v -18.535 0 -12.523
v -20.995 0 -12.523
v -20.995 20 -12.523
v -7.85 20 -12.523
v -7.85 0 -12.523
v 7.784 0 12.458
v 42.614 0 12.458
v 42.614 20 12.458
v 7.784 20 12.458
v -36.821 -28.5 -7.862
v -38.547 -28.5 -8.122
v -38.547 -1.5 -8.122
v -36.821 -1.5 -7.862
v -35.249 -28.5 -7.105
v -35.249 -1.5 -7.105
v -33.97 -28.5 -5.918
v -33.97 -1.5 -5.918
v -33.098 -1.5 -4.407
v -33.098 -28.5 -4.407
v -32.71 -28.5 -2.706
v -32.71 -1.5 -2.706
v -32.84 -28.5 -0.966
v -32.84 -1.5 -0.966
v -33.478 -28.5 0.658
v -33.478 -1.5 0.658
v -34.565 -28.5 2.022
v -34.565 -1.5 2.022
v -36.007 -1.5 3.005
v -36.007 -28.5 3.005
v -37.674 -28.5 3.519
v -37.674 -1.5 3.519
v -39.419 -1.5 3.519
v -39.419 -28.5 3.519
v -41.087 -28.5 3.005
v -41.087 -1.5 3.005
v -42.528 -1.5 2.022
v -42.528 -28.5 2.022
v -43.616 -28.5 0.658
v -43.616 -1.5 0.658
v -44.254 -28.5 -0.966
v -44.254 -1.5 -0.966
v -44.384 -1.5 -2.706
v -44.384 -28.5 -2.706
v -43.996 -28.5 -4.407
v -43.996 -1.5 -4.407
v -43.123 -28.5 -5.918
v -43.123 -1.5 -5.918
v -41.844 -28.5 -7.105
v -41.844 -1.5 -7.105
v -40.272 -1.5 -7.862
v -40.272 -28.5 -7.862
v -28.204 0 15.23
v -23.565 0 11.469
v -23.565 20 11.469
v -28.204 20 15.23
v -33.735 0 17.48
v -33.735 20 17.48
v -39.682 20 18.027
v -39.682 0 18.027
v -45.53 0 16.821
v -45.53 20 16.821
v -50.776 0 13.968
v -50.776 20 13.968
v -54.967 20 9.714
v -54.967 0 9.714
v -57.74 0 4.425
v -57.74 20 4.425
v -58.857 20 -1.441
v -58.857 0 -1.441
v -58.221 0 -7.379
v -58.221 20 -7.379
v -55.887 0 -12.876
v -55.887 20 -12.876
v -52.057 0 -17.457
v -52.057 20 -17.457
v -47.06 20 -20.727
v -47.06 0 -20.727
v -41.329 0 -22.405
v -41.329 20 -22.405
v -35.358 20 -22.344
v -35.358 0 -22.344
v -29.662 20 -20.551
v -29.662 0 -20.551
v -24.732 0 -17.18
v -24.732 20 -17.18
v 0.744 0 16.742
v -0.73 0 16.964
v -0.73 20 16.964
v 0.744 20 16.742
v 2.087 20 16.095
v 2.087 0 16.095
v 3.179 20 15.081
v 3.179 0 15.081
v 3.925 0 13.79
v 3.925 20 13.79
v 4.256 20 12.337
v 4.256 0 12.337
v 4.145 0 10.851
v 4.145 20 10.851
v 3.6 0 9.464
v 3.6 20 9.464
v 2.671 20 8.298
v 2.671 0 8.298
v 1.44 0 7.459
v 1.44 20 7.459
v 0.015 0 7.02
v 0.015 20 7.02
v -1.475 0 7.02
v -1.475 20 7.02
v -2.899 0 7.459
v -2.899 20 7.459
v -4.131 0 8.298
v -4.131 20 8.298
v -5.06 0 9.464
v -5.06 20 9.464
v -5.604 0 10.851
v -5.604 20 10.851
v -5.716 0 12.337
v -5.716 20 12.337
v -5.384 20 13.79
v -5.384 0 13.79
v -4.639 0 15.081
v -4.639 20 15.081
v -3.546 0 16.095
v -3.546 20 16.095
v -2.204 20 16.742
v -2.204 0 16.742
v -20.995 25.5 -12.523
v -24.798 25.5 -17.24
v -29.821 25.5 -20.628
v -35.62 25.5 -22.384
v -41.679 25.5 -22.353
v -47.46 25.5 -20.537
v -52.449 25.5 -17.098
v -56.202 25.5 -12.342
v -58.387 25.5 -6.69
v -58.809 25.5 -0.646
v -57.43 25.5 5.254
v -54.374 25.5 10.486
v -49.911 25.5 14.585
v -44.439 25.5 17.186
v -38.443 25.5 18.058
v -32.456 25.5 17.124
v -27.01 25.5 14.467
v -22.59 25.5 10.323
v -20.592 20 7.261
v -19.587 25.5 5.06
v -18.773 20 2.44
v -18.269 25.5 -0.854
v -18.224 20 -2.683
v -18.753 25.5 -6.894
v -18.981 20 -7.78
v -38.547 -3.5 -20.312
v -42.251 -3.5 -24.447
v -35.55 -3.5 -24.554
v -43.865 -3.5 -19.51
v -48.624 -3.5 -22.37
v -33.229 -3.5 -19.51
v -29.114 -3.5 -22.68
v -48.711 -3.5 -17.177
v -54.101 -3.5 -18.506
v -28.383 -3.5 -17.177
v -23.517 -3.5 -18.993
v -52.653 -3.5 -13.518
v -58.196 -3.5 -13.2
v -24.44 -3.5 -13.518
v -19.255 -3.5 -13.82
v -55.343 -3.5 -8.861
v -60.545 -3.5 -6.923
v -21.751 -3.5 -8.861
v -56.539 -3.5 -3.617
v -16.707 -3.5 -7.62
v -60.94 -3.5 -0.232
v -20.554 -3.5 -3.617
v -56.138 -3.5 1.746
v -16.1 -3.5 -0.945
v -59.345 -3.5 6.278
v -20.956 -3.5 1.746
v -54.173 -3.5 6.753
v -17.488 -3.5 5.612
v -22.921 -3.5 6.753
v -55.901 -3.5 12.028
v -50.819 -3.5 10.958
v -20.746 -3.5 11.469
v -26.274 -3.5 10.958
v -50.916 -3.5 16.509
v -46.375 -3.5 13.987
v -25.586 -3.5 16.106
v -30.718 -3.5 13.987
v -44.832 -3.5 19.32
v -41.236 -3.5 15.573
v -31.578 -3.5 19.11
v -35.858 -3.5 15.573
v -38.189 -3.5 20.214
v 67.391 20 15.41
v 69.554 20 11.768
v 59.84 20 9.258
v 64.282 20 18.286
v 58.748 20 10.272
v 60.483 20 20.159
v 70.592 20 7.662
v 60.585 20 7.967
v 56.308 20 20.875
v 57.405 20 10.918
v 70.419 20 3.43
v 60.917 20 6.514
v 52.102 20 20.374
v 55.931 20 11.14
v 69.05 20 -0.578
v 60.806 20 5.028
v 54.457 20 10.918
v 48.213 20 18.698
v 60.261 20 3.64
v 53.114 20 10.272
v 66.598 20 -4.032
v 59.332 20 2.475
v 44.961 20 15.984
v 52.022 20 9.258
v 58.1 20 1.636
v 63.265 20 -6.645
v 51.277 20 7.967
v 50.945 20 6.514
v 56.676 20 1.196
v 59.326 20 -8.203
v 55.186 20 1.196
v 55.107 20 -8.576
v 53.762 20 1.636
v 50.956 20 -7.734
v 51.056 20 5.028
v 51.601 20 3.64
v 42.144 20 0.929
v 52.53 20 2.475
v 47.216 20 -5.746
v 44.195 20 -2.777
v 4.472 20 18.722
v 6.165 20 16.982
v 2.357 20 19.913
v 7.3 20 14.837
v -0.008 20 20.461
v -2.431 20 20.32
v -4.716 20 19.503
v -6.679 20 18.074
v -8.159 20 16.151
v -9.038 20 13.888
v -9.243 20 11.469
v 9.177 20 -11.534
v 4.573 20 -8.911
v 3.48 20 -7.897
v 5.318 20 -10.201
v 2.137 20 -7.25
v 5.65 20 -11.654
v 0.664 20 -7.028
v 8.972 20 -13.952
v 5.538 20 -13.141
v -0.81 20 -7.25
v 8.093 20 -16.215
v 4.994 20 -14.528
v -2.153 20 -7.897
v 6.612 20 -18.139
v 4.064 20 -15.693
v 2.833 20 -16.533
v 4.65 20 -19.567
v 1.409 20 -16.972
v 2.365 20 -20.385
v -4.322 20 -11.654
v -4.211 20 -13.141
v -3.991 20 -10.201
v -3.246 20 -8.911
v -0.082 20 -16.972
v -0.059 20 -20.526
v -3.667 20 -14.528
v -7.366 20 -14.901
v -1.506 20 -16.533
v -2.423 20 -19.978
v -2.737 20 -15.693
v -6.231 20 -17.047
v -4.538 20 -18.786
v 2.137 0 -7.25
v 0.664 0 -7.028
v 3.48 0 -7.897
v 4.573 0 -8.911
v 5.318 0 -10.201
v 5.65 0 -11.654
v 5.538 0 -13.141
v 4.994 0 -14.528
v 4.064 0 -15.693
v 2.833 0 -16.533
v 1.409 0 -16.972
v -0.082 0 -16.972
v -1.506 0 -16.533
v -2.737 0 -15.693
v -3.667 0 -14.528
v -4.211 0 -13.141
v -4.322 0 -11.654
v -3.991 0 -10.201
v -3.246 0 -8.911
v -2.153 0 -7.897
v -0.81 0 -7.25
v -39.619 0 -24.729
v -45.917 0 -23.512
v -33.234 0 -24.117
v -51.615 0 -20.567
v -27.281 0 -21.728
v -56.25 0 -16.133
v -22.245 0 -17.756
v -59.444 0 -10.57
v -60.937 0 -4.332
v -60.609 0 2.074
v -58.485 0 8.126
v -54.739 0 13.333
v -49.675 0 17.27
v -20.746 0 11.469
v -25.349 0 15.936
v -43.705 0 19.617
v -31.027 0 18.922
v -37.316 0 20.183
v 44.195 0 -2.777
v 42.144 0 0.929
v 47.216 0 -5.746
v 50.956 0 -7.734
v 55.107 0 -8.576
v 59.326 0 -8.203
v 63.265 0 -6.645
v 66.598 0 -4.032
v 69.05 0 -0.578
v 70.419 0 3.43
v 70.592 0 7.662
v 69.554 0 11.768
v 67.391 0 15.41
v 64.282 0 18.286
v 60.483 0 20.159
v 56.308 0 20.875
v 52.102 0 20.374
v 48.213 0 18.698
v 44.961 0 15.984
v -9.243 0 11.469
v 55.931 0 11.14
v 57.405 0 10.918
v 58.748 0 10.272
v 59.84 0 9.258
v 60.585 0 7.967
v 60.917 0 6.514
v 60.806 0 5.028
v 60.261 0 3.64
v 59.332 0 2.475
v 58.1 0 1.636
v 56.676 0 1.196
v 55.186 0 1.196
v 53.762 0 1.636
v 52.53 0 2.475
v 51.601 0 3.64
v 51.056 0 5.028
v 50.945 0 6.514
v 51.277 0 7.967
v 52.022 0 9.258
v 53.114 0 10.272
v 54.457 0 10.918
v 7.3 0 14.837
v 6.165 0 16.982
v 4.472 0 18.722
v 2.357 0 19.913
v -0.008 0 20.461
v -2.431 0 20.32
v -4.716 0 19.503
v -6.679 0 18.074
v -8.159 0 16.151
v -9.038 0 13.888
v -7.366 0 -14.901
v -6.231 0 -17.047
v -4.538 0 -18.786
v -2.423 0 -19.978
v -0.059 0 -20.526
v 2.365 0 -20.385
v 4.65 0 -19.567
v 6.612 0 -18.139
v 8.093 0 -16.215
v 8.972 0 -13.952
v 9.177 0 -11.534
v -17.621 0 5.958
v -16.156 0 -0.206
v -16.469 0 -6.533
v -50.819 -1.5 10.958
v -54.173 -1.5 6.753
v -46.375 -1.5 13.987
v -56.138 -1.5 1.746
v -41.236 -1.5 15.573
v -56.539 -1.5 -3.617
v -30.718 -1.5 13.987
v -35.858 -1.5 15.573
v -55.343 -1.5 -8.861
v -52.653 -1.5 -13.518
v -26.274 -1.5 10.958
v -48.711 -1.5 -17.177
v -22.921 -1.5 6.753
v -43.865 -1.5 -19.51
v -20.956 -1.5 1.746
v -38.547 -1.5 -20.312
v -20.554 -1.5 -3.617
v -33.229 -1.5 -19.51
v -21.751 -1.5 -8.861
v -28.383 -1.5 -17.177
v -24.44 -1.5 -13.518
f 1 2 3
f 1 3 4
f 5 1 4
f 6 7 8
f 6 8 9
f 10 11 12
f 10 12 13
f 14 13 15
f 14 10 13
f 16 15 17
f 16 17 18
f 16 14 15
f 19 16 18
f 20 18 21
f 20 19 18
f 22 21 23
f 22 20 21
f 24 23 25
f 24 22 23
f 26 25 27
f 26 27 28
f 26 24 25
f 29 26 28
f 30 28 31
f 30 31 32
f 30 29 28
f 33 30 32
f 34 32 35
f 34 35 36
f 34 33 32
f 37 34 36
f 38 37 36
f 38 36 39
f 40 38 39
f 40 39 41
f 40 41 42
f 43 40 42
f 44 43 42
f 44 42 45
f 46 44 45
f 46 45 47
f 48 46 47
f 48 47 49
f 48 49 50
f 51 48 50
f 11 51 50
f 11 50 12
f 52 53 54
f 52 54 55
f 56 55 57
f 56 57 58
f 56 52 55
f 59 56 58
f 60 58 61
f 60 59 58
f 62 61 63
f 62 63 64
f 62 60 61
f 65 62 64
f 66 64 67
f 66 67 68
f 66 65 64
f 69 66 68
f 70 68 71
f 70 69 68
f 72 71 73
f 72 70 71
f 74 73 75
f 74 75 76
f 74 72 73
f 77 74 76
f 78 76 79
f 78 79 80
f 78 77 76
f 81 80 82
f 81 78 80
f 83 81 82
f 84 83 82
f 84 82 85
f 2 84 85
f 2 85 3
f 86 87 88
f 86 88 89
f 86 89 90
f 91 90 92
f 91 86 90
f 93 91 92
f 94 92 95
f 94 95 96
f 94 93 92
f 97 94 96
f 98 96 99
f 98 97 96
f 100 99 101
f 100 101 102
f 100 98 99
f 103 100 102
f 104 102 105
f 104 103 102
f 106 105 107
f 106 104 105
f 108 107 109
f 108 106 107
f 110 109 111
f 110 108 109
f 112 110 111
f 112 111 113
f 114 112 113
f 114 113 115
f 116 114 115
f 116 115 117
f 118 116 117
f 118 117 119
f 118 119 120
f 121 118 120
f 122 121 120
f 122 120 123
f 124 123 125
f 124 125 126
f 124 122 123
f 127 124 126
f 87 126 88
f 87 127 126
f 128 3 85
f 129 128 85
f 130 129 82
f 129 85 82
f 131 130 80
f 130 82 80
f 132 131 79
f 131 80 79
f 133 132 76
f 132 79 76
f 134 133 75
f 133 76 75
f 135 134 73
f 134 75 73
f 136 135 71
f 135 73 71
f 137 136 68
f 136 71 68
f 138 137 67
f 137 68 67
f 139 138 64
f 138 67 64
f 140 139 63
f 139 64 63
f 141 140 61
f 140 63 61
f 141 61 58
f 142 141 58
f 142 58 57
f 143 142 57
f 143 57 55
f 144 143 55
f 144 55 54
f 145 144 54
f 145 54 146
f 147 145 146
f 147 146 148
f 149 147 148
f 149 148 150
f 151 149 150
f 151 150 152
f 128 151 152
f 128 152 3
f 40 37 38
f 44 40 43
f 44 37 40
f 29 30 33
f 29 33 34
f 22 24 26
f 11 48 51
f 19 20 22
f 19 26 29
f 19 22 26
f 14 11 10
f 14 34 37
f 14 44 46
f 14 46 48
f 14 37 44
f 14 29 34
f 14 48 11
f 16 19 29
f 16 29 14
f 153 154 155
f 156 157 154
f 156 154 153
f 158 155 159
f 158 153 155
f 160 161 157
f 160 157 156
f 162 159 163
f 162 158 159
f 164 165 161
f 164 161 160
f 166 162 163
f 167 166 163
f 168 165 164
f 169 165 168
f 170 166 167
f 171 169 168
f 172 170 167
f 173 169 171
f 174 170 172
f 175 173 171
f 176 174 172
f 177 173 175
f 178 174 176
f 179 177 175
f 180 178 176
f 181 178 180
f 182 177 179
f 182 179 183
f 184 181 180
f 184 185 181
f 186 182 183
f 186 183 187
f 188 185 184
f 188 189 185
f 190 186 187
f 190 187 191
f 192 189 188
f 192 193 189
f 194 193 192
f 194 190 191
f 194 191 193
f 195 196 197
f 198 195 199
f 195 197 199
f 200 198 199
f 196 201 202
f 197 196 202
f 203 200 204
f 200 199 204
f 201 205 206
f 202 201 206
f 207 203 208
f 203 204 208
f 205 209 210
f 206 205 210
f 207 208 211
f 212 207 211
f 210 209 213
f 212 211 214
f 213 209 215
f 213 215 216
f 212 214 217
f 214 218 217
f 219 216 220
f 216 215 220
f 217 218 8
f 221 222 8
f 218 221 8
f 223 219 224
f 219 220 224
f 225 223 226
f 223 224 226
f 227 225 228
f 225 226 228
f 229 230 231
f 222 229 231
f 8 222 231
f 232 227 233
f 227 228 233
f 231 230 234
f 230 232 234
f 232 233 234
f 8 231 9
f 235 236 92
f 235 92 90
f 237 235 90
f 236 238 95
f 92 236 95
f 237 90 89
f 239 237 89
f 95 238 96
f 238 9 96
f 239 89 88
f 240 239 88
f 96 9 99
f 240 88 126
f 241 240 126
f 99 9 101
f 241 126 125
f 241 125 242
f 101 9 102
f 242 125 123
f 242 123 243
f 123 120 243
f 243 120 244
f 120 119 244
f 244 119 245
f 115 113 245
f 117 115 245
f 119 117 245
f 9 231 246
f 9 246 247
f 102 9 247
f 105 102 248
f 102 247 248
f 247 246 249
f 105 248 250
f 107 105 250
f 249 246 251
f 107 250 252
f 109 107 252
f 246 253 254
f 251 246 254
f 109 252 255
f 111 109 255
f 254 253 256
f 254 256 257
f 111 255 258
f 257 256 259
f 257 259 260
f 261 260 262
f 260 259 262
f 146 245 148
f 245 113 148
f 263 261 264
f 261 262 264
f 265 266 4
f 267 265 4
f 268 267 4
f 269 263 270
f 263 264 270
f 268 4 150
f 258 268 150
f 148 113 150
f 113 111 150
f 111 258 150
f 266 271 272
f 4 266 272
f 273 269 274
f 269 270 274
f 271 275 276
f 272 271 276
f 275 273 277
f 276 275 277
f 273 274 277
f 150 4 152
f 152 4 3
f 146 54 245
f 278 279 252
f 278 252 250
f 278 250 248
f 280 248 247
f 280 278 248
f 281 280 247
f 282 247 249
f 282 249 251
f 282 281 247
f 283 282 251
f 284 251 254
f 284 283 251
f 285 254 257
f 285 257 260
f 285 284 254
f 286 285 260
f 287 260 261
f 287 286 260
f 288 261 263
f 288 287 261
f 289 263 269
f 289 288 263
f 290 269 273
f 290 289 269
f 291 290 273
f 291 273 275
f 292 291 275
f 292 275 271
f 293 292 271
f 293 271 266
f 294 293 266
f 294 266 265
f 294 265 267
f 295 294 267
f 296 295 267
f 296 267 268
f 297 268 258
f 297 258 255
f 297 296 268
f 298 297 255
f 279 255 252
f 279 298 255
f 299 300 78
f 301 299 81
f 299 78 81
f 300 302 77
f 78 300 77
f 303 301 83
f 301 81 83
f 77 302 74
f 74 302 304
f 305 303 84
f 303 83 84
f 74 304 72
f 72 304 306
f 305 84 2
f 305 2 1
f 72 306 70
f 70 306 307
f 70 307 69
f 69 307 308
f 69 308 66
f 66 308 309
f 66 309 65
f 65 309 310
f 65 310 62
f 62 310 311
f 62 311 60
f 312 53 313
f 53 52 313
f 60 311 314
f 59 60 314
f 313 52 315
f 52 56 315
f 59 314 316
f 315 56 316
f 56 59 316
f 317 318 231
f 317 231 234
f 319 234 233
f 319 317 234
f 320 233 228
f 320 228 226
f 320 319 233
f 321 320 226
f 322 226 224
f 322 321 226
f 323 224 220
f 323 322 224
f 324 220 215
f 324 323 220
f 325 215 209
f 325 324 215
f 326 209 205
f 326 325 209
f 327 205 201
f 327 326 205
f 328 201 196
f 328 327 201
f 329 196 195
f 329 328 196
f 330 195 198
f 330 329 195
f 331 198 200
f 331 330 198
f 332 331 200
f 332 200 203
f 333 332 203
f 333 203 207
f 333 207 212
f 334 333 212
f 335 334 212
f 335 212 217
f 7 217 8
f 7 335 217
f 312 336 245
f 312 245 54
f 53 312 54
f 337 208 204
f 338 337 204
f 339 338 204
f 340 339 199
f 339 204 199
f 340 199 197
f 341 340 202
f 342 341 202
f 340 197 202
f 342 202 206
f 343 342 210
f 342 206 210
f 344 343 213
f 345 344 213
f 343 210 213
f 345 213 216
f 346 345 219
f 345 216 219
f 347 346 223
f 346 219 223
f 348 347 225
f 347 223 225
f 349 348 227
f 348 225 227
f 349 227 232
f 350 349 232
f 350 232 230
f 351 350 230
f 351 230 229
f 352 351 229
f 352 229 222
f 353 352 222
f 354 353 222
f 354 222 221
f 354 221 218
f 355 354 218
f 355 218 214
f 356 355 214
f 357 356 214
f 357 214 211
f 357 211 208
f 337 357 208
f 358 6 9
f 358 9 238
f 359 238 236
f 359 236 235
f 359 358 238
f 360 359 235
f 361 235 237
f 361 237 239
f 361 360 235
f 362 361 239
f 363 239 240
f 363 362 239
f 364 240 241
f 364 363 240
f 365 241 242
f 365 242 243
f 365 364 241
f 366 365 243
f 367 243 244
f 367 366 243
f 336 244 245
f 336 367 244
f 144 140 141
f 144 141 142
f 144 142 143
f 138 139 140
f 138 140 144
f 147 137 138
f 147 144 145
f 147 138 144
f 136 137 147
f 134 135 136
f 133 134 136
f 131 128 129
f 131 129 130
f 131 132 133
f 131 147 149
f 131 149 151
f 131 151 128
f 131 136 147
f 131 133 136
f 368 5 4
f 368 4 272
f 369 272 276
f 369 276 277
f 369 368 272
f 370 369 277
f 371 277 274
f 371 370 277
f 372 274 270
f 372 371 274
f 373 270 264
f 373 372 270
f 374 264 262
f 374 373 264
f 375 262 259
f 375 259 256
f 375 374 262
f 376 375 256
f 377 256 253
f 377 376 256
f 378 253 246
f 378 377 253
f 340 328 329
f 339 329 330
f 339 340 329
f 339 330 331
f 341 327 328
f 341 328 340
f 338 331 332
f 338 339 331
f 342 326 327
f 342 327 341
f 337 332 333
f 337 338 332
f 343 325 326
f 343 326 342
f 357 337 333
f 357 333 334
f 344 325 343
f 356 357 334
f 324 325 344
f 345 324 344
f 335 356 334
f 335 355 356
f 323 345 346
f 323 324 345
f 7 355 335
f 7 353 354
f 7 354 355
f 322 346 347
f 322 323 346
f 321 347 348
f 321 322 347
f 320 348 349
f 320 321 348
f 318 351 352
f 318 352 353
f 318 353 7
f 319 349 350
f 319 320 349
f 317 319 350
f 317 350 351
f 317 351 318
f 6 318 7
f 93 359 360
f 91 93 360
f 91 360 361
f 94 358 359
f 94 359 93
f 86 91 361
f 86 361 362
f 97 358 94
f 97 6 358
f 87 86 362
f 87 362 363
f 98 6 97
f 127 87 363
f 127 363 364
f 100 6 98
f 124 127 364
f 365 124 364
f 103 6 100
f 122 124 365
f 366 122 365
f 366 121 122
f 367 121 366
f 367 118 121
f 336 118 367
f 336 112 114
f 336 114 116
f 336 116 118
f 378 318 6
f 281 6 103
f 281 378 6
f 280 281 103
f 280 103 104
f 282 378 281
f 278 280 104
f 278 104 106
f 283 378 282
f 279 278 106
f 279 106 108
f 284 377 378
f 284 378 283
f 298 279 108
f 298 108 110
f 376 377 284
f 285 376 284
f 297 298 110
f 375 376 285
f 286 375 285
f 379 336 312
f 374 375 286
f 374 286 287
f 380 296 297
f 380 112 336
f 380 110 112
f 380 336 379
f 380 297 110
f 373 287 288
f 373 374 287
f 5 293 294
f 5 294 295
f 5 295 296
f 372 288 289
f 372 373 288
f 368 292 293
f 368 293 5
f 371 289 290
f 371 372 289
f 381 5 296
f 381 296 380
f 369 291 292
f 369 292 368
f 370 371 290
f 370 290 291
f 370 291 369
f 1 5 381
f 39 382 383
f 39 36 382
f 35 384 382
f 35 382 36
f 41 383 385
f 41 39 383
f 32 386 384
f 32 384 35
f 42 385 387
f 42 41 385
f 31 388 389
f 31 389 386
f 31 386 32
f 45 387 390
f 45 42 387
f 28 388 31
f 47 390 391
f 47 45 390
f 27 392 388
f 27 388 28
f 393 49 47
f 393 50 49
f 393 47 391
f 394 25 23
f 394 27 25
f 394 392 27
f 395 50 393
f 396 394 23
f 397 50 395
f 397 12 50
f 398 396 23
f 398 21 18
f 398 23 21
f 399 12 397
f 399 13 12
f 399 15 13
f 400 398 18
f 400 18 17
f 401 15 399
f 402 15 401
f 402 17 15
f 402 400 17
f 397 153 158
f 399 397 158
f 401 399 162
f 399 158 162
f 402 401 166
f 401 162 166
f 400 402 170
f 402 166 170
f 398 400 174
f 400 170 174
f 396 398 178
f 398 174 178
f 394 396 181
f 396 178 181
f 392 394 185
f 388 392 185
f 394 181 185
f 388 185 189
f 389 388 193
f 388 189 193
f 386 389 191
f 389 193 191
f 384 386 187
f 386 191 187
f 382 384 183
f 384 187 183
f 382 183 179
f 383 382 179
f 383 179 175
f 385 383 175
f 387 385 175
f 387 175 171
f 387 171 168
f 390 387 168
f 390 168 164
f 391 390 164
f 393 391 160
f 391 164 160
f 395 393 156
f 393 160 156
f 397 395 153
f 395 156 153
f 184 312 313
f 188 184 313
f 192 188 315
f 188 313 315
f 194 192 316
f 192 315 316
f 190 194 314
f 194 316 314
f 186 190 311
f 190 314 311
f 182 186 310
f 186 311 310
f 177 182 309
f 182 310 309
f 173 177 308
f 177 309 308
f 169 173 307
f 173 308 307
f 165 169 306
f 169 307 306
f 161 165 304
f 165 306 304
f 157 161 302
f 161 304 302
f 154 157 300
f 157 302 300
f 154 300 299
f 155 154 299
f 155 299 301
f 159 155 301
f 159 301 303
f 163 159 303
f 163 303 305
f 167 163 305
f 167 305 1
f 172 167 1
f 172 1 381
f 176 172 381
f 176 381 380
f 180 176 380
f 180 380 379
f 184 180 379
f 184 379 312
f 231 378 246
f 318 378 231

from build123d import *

# Parameters (mm, degrees)
SKETCH1_R           = 5
BOSS_EXTRUDE1_DEPTH = 20
SKETCH2_R           = 5
CUT_EXTRUDE1_DEPTH  = 75
SKETCH3_R           = 22.485447426
BOSS_EXTRUDE2_DEPTH = 3.5
SKETCH4_R           = 20.327044556
BOSS_EXTRUDE3_DEPTH = 5.5
SKETCH5_R           = 18.043078954
SKETCH5_R_2         = 5.853514337
CUT_EXTRUDE2_DEPTH  = 2
BOSS_EXTRUDE5_START = 25
SKETCH7_R           = 5.853514337
BOSS_EXTRUDE5_DEPTH = 25


with BuildPart() as part:
    # Sketch1 → Boss-Extrude1 (new body)
    with BuildSketch(Plane(origin=(0, 0, 0), x_dir=(1, 0, 0), z_dir=(0, 1, 0))):
        with BuildLine():
            Line((9.177252883, 11.533668593), (42.143741373, -0.928512909))
            ThreePointArc((42.143741373, -0.928512909), (70.658147952, -5.539619318), (42.614104982, -12.458097383))
            Line((42.614104982, -12.458097383), (7.783972854, -12.458097383))
            ThreePointArc((7.783972854, -12.458097383), (-1.224173666, -20.477404202), (-9.243480486, -11.469257682))
            Line((-9.243480486, -11.469257682), (-23.565055604, -11.469257682))
            ThreePointArc((-23.565055604, -11.469257682), (-58.758292474, 4.433528189), (-20.995467888, 12.522508294))
            Line((-20.995467888, 12.522508294), (-7.850200457, 12.522508294))
            ThreePointArc((-7.850200457, 12.522508294), (1.157946064, 20.541815114), (9.177252883, 11.533668593))
        make_face()
        with Locations(Location((0.663526213, 12.028088444, 0), (0, 0, 270))):
            Circle(SKETCH1_R, mode=Mode.SUBTRACT)
        with Locations(Location((-0.729753816, -11.963677532, 0), (0, 0, 270))):
            Circle(SKETCH1_R, mode=Mode.SUBTRACT)
    extrude(amount=BOSS_EXTRUDE1_DEPTH)

    # Sketch2 → Cut-Extrude1 (cut)
    with BuildSketch(Plane(origin=(0, 20, 0), x_dir=(1, 0, 0), z_dir=(0, 1, 0))):
        with Locations(Location((55.93095175, -6.140433438, 0), (0, 0, 270))):
            Circle(SKETCH2_R)
    extrude(amount=-CUT_EXTRUDE1_DEPTH, mode=Mode.SUBTRACT)

    # Sketch3 → Boss-Extrude2 (add)
    with BuildSketch(Plane.XZ):
        with Locations(Location((-38.546840471, -2.268823063, 0), (0, 0, 37.660146308))):
            Circle(SKETCH3_R)
    extrude(amount=BOSS_EXTRUDE2_DEPTH)

    # Sketch4 → Boss-Extrude3 (add)
    with BuildSketch(Plane(origin=(0, 20, 0), x_dir=(1, 0, 0), z_dir=(0, 1, 0))):
        with Locations(Location((-38.546840471, 2.268823063, 0), (0, 0, 30.293894425))):
            Circle(SKETCH4_R)
    extrude(amount=BOSS_EXTRUDE3_DEPTH)

    # Sketch5 → Cut-Extrude2 (cut)
    with BuildSketch(Plane.XZ.offset(3.5)):
        with Locations(Location((-38.546840471, -2.268823063, 0), (0, 0, 270))):
            Circle(SKETCH5_R)
        with Locations(Location((-38.546840471, -2.268823063, 0), (0, 0, 270))):
            Circle(SKETCH5_R_2, mode=Mode.SUBTRACT)
    extrude(amount=-CUT_EXTRUDE2_DEPTH, mode=Mode.SUBTRACT)

    # Sketch7 → Boss-Extrude5 (add)
    with BuildSketch(Plane.XZ.offset(3.5).offset(BOSS_EXTRUDE5_START)):
        with Locations(Location((-38.546840471, -2.268823063, 0), (0, 0, 270))):
            Circle(SKETCH7_R)
    extrude(amount=-BOSS_EXTRUDE5_DEPTH)


solid = part.part
